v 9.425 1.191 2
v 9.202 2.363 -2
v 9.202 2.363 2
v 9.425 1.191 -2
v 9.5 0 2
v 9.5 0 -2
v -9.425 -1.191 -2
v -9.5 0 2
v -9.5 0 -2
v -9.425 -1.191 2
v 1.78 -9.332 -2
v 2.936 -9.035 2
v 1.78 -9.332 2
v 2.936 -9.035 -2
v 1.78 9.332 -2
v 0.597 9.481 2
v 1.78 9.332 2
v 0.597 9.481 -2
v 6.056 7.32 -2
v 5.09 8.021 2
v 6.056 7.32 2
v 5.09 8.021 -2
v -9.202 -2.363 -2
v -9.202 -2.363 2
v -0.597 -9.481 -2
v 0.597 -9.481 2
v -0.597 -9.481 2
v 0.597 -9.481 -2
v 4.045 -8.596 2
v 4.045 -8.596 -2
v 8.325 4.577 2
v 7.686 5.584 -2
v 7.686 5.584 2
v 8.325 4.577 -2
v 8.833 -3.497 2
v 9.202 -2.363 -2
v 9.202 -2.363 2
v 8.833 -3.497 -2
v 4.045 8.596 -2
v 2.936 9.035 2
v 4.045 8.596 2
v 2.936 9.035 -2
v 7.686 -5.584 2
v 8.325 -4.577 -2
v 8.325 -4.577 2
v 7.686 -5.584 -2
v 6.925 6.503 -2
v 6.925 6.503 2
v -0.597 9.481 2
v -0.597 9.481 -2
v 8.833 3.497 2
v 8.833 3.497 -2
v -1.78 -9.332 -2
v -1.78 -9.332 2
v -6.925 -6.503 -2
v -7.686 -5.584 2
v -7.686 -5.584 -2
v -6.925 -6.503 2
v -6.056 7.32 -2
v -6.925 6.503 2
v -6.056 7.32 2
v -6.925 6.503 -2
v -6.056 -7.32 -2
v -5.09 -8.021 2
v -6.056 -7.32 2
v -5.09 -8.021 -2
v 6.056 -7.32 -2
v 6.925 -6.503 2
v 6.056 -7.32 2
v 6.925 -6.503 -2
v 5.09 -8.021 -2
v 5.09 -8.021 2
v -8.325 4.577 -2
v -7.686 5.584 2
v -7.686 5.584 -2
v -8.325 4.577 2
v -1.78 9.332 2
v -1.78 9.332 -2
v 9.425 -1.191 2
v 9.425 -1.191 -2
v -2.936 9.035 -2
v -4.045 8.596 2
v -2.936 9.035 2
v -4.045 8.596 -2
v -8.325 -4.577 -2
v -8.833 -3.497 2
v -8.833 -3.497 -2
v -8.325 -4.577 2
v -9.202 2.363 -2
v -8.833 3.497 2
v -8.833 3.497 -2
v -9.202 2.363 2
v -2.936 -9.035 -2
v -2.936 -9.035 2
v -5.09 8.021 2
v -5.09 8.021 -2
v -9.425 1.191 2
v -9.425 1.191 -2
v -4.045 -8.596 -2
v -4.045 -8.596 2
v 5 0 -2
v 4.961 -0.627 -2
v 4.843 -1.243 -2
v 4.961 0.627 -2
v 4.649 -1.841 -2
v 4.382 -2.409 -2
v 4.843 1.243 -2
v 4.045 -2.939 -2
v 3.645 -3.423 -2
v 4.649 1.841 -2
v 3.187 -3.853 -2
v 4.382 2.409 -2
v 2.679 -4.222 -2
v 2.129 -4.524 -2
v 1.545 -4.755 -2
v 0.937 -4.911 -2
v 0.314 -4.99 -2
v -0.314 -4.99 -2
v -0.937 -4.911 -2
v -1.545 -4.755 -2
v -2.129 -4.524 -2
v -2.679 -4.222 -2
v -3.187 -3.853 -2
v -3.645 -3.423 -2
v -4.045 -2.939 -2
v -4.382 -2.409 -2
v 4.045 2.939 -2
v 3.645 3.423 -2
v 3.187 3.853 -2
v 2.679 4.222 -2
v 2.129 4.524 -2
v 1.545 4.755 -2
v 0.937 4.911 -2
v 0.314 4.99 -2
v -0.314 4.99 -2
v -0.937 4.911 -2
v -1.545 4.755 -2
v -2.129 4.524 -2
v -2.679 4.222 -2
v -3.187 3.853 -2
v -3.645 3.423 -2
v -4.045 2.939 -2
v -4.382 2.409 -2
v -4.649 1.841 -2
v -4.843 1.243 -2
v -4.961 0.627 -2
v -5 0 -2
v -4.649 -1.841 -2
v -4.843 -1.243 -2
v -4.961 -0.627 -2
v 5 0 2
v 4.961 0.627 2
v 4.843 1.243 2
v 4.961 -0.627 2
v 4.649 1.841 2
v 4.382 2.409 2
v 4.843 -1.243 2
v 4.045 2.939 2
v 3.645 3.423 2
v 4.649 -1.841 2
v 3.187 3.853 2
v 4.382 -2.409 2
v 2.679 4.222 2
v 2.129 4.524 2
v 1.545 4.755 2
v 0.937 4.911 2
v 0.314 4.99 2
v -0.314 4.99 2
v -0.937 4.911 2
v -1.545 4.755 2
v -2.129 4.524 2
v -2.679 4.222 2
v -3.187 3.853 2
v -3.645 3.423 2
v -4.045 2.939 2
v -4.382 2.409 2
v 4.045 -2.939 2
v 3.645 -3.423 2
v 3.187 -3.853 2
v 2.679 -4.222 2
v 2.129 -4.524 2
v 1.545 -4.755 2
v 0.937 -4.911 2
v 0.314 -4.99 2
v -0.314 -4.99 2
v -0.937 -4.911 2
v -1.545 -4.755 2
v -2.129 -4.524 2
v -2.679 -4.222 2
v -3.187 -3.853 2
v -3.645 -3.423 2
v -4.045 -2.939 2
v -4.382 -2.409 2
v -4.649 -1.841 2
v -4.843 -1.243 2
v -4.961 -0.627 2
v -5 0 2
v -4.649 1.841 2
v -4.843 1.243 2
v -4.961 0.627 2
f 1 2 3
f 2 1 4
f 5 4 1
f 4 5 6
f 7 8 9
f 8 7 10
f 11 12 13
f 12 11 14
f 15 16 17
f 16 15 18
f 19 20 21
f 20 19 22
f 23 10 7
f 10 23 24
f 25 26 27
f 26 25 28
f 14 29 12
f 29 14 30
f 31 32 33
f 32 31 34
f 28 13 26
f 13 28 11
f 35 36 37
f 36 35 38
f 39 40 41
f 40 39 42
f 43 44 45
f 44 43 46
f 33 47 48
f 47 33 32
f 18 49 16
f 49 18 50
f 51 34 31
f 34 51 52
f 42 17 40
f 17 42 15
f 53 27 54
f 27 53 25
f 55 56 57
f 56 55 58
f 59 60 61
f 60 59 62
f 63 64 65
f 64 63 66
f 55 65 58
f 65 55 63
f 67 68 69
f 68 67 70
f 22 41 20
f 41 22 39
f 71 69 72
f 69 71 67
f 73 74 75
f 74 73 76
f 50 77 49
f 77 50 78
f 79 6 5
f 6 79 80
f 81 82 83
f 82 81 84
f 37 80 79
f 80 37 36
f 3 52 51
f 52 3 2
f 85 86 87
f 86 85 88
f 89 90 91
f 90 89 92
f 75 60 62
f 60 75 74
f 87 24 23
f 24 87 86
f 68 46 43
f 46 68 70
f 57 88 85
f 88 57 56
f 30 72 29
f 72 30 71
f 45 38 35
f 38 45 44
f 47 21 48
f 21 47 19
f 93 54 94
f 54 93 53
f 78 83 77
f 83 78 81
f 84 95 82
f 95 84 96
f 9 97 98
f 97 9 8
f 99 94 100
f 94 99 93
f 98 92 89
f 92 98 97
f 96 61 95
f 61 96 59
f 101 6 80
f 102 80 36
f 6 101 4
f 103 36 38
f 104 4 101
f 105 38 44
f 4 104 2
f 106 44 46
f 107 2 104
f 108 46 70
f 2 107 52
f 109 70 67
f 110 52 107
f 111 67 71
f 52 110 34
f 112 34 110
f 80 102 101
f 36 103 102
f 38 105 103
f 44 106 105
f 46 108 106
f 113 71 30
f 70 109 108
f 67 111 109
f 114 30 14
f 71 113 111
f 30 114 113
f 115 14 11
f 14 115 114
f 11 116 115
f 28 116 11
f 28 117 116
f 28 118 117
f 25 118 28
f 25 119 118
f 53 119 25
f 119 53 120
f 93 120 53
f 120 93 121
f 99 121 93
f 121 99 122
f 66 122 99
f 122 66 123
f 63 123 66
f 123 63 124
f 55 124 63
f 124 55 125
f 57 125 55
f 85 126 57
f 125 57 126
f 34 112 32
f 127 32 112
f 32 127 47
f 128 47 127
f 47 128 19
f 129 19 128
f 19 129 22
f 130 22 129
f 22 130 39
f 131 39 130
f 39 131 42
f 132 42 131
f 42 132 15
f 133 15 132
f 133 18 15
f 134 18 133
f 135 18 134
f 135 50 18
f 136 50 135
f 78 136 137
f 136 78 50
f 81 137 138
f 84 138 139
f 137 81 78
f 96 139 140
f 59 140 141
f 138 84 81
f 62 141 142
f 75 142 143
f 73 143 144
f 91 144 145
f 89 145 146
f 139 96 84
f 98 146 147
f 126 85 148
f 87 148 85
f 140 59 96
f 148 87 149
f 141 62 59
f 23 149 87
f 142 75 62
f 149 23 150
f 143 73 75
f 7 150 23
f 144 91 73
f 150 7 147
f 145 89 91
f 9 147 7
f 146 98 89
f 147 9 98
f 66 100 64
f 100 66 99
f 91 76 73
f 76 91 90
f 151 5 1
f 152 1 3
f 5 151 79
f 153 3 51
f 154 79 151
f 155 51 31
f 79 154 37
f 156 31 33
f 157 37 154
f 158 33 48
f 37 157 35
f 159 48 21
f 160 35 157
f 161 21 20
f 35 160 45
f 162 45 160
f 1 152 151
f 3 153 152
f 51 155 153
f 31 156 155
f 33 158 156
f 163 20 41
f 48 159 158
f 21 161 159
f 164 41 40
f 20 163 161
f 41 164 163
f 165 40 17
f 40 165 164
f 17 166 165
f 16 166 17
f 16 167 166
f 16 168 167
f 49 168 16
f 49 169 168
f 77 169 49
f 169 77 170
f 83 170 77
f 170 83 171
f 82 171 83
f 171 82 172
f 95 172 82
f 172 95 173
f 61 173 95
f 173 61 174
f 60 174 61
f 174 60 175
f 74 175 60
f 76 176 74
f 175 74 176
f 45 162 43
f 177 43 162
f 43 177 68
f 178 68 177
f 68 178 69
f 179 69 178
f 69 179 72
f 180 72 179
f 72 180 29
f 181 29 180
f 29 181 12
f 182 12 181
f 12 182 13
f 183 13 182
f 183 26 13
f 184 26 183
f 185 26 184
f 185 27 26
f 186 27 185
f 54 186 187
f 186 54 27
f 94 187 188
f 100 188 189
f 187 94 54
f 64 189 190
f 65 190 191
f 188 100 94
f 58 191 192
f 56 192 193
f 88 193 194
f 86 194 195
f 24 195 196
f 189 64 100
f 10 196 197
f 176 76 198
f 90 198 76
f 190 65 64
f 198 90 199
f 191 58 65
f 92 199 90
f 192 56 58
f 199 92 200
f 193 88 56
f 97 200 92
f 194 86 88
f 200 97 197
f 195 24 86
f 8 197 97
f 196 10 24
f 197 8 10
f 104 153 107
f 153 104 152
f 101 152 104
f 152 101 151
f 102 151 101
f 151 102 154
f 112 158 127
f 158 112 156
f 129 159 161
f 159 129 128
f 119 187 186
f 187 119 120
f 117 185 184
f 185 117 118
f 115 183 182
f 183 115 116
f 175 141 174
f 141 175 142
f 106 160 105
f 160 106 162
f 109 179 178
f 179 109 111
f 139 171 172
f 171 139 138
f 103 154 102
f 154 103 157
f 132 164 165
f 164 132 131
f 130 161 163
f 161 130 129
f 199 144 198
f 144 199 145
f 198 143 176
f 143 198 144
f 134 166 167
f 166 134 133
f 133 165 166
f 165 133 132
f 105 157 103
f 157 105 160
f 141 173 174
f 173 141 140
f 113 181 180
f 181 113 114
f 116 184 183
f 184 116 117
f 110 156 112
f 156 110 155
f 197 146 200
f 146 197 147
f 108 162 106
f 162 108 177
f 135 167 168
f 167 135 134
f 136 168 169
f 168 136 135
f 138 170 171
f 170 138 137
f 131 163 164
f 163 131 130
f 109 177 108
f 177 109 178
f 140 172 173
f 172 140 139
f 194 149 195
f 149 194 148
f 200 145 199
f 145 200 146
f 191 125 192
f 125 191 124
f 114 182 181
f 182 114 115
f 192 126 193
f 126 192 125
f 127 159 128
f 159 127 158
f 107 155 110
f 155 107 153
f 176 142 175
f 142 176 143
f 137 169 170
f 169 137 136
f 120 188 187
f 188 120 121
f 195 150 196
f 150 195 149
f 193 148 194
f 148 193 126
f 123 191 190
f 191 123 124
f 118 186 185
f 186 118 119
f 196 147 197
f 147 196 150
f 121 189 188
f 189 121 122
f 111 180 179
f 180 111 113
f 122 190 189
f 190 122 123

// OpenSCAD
$fn = 50;


difference() {
	union() {
		translate(v = [0, 0, -2.0000000000]) {
			cylinder(h = 4, r = 9.5000000000);
		}
	}
	union() {
		translate(v = [0, 0, -100.0000000000]) {
			cylinder(h = 200, r = 5.0000000000);
		}
	}
}
